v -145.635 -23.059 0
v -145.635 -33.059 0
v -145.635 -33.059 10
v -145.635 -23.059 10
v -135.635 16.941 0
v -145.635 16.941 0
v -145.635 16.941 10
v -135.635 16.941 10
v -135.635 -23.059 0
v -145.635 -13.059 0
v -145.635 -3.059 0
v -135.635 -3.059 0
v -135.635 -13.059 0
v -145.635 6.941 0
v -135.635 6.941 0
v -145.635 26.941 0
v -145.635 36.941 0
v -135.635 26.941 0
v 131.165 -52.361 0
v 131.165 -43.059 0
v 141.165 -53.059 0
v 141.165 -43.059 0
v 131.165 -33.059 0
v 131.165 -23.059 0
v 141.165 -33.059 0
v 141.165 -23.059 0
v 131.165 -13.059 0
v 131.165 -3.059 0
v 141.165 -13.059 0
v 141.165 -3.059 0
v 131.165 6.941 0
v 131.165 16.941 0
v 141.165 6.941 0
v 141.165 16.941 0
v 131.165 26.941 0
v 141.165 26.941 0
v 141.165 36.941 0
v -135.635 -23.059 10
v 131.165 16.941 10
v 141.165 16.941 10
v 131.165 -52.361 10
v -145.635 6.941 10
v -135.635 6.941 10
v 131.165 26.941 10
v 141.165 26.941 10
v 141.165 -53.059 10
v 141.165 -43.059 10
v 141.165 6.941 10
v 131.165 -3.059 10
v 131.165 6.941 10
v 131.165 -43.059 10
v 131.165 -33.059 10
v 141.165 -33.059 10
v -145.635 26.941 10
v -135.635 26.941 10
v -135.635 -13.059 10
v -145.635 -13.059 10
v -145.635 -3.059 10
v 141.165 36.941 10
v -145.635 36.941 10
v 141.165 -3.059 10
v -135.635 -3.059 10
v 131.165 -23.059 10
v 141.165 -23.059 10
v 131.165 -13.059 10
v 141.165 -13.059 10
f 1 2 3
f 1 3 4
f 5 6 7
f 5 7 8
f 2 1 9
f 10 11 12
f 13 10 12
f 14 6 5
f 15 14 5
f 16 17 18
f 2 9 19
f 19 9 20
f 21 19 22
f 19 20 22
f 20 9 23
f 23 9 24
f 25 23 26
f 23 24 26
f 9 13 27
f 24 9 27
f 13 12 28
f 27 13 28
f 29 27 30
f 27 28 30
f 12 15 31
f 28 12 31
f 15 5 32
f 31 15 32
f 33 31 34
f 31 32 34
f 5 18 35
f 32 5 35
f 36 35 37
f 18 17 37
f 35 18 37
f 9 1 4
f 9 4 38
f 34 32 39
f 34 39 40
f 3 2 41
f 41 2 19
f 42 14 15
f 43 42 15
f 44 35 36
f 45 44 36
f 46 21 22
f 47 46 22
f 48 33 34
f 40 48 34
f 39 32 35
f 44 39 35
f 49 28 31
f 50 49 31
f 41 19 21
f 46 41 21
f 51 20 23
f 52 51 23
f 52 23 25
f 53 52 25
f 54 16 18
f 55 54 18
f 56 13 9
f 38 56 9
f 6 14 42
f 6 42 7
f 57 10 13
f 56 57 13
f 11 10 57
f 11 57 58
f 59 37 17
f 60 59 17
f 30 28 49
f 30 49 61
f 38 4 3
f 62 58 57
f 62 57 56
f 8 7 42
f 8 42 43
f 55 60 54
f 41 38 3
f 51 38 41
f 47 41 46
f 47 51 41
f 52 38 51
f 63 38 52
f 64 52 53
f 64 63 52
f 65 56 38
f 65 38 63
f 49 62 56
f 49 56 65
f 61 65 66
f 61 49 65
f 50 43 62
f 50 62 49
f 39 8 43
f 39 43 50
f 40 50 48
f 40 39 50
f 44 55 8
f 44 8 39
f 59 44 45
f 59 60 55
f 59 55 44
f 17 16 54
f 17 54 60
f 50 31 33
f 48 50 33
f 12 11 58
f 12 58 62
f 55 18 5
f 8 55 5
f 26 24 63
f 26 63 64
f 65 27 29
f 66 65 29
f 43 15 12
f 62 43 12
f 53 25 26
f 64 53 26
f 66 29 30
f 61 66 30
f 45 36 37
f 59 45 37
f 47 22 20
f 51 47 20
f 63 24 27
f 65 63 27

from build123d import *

# Parameters (mm, degrees)
F0_W     = 10
F0_H     = 10
F1_DEPTH = 10


# Not quite as in the source:
# - a feature names something its author has since deleted; it is built from what else it names


with BuildPart() as f1:
    # F0 (on Top) → F1 (new body)
    with BuildSketch(Plane.XY):
        Polygon((131.1653250098, 36.9413525529), (-135.6346749902, 36.9413525529), (-135.6346749902, 26.9413525529), (-135.6346749902, 16.9413525529), (-135.6346749902, 6.9413525529), (-135.6346749902, -3.0586474471), (-135.6346749902, -13.0586474471), (-135.6346749902, -23.0586474471), (-135.6346749902, -33.0586474471), (131.1653250098, -33.0586474471), (131.1653250098, -23.0586474471), (131.1653250098, -13.0586474471), (131.1653250098, -3.0586474471), (131.1653250098, 6.9413525529), (131.1653250098, 16.9413525529), (131.1653250098, 26.9413525529), align=None)
        with Locations((-140.6346749902, 31.9413525529)):
            Rectangle(F0_W, F0_H)
        with Locations((-140.6346749902, 11.9413525529)):
            Rectangle(F0_W, F0_H)
        with Locations((-140.6346749902, -8.0586474471)):
            Rectangle(F0_W, F0_H)
        with Locations((-140.6346749902, -28.0586474471)):
            Rectangle(F0_W, F0_H)
        with Locations((136.1653250098, 31.9413525529)):
            Rectangle(F0_W, F0_H)
        with Locations((136.1653250098, 11.9413525529)):
            Rectangle(F0_W, F0_H)
        with Locations((136.1653250098, -8.0586474471)):
            Rectangle(F0_W, F0_H)
        with Locations((136.1653250098, -28.0586474471)):
            Rectangle(F0_W, F0_H)
        Polygon((-135.6346749902, -33.0586474471), (-145.6346749902, -33.0586474471), (131.1653250098, -52.3612973773), (131.1653250098, -43.0586474471), (131.1653250098, -33.0586474471), align=None)
        Polygon((131.1653250098, -43.0586474471), (131.1653250098, -52.3612973773), (141.1653250098, -53.0586474471), (141.1653250098, -43.0586474471), align=None)
    extrude(amount=F1_DEPTH)


solid = f1.part
